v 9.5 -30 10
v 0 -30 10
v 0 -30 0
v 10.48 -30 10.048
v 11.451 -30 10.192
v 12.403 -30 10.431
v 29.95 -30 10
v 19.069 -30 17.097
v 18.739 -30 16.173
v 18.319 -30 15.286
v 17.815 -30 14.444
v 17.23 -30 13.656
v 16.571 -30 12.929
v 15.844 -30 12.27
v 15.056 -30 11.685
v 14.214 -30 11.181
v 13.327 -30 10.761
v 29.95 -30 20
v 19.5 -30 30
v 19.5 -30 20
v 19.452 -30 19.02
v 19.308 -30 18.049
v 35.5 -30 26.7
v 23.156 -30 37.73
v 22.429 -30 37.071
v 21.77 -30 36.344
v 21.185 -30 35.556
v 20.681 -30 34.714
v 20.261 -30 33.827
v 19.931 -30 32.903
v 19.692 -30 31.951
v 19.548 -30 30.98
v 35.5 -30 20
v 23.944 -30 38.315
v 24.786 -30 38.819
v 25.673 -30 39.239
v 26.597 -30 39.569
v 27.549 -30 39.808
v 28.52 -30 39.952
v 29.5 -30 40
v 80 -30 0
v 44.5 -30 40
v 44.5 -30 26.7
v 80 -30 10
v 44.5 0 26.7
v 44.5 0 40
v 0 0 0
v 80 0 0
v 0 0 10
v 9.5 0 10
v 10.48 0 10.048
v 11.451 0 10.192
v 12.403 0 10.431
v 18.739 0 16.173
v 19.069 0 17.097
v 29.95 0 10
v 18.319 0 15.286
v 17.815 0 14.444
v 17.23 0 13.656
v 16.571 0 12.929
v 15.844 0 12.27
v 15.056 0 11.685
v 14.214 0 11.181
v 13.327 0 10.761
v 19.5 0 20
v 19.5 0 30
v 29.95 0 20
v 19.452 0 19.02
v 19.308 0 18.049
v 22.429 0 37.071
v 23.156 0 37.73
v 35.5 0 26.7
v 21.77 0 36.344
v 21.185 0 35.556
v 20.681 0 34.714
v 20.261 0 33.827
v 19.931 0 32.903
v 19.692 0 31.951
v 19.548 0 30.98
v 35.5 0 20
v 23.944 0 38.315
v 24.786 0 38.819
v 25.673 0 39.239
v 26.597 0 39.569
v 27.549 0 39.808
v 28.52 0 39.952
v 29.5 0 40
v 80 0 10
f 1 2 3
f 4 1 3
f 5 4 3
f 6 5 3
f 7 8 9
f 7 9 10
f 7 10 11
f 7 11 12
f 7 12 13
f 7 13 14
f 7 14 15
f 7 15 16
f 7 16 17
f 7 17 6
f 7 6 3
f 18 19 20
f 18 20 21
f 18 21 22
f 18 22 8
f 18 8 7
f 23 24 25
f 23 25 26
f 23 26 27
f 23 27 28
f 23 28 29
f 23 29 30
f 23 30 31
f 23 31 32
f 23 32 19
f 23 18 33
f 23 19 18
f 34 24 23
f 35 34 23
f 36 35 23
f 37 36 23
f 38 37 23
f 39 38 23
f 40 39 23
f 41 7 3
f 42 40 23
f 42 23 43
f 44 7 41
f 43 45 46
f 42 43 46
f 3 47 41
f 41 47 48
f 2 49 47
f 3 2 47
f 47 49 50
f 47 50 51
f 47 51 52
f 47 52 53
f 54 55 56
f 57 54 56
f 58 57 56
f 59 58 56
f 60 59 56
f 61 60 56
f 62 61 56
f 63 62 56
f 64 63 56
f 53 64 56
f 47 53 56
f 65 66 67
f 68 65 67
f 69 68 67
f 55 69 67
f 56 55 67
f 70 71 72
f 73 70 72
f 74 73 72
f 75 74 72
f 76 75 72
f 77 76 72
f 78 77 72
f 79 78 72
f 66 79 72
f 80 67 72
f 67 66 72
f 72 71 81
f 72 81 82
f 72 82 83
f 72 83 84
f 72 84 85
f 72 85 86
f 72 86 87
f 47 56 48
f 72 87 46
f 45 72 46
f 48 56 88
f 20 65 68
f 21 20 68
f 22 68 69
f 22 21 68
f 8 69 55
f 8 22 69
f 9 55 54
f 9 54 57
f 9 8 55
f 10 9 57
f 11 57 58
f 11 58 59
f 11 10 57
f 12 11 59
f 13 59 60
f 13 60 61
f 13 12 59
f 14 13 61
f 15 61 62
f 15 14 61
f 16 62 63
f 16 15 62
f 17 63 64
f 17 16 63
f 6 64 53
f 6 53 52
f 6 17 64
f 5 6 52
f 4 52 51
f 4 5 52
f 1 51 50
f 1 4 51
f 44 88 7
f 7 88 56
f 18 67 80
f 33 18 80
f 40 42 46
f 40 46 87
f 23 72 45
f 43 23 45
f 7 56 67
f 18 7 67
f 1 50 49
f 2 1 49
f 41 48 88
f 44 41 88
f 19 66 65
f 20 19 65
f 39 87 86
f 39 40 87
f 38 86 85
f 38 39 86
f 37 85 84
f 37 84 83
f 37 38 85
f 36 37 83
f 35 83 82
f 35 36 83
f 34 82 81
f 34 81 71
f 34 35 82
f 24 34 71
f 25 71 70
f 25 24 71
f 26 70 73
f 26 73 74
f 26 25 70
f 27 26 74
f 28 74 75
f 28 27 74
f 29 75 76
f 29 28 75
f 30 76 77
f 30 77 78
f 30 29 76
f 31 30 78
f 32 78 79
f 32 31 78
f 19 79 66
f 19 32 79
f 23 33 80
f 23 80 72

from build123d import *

# Parameters (mm, degrees)
F1_DEPTH = 30
F2_R     = 10


with BuildPart() as f1:
    # F0 (on Front) → F1 (new body)
    with BuildSketch(Plane.XZ):
        Polygon((0, 10), (0, 0), (80, 0), (80, 10), (29.95, 10), (29.95, 20), (35.5, 20), (35.5, 26.7), (44.5, 26.7), (44.5, 40), (19.5, 40), (19.5, 10), align=None)
    extrude(amount=F1_DEPTH)

    # F2
    f2_edges = [f1.edges().sort_by_distance(p)[0] for p in [
        (19.5, -15, 10),
        (19.5, -15, 40),
    ]]
    fillet(f2_edges, radius=F2_R)


solid = f1.part
